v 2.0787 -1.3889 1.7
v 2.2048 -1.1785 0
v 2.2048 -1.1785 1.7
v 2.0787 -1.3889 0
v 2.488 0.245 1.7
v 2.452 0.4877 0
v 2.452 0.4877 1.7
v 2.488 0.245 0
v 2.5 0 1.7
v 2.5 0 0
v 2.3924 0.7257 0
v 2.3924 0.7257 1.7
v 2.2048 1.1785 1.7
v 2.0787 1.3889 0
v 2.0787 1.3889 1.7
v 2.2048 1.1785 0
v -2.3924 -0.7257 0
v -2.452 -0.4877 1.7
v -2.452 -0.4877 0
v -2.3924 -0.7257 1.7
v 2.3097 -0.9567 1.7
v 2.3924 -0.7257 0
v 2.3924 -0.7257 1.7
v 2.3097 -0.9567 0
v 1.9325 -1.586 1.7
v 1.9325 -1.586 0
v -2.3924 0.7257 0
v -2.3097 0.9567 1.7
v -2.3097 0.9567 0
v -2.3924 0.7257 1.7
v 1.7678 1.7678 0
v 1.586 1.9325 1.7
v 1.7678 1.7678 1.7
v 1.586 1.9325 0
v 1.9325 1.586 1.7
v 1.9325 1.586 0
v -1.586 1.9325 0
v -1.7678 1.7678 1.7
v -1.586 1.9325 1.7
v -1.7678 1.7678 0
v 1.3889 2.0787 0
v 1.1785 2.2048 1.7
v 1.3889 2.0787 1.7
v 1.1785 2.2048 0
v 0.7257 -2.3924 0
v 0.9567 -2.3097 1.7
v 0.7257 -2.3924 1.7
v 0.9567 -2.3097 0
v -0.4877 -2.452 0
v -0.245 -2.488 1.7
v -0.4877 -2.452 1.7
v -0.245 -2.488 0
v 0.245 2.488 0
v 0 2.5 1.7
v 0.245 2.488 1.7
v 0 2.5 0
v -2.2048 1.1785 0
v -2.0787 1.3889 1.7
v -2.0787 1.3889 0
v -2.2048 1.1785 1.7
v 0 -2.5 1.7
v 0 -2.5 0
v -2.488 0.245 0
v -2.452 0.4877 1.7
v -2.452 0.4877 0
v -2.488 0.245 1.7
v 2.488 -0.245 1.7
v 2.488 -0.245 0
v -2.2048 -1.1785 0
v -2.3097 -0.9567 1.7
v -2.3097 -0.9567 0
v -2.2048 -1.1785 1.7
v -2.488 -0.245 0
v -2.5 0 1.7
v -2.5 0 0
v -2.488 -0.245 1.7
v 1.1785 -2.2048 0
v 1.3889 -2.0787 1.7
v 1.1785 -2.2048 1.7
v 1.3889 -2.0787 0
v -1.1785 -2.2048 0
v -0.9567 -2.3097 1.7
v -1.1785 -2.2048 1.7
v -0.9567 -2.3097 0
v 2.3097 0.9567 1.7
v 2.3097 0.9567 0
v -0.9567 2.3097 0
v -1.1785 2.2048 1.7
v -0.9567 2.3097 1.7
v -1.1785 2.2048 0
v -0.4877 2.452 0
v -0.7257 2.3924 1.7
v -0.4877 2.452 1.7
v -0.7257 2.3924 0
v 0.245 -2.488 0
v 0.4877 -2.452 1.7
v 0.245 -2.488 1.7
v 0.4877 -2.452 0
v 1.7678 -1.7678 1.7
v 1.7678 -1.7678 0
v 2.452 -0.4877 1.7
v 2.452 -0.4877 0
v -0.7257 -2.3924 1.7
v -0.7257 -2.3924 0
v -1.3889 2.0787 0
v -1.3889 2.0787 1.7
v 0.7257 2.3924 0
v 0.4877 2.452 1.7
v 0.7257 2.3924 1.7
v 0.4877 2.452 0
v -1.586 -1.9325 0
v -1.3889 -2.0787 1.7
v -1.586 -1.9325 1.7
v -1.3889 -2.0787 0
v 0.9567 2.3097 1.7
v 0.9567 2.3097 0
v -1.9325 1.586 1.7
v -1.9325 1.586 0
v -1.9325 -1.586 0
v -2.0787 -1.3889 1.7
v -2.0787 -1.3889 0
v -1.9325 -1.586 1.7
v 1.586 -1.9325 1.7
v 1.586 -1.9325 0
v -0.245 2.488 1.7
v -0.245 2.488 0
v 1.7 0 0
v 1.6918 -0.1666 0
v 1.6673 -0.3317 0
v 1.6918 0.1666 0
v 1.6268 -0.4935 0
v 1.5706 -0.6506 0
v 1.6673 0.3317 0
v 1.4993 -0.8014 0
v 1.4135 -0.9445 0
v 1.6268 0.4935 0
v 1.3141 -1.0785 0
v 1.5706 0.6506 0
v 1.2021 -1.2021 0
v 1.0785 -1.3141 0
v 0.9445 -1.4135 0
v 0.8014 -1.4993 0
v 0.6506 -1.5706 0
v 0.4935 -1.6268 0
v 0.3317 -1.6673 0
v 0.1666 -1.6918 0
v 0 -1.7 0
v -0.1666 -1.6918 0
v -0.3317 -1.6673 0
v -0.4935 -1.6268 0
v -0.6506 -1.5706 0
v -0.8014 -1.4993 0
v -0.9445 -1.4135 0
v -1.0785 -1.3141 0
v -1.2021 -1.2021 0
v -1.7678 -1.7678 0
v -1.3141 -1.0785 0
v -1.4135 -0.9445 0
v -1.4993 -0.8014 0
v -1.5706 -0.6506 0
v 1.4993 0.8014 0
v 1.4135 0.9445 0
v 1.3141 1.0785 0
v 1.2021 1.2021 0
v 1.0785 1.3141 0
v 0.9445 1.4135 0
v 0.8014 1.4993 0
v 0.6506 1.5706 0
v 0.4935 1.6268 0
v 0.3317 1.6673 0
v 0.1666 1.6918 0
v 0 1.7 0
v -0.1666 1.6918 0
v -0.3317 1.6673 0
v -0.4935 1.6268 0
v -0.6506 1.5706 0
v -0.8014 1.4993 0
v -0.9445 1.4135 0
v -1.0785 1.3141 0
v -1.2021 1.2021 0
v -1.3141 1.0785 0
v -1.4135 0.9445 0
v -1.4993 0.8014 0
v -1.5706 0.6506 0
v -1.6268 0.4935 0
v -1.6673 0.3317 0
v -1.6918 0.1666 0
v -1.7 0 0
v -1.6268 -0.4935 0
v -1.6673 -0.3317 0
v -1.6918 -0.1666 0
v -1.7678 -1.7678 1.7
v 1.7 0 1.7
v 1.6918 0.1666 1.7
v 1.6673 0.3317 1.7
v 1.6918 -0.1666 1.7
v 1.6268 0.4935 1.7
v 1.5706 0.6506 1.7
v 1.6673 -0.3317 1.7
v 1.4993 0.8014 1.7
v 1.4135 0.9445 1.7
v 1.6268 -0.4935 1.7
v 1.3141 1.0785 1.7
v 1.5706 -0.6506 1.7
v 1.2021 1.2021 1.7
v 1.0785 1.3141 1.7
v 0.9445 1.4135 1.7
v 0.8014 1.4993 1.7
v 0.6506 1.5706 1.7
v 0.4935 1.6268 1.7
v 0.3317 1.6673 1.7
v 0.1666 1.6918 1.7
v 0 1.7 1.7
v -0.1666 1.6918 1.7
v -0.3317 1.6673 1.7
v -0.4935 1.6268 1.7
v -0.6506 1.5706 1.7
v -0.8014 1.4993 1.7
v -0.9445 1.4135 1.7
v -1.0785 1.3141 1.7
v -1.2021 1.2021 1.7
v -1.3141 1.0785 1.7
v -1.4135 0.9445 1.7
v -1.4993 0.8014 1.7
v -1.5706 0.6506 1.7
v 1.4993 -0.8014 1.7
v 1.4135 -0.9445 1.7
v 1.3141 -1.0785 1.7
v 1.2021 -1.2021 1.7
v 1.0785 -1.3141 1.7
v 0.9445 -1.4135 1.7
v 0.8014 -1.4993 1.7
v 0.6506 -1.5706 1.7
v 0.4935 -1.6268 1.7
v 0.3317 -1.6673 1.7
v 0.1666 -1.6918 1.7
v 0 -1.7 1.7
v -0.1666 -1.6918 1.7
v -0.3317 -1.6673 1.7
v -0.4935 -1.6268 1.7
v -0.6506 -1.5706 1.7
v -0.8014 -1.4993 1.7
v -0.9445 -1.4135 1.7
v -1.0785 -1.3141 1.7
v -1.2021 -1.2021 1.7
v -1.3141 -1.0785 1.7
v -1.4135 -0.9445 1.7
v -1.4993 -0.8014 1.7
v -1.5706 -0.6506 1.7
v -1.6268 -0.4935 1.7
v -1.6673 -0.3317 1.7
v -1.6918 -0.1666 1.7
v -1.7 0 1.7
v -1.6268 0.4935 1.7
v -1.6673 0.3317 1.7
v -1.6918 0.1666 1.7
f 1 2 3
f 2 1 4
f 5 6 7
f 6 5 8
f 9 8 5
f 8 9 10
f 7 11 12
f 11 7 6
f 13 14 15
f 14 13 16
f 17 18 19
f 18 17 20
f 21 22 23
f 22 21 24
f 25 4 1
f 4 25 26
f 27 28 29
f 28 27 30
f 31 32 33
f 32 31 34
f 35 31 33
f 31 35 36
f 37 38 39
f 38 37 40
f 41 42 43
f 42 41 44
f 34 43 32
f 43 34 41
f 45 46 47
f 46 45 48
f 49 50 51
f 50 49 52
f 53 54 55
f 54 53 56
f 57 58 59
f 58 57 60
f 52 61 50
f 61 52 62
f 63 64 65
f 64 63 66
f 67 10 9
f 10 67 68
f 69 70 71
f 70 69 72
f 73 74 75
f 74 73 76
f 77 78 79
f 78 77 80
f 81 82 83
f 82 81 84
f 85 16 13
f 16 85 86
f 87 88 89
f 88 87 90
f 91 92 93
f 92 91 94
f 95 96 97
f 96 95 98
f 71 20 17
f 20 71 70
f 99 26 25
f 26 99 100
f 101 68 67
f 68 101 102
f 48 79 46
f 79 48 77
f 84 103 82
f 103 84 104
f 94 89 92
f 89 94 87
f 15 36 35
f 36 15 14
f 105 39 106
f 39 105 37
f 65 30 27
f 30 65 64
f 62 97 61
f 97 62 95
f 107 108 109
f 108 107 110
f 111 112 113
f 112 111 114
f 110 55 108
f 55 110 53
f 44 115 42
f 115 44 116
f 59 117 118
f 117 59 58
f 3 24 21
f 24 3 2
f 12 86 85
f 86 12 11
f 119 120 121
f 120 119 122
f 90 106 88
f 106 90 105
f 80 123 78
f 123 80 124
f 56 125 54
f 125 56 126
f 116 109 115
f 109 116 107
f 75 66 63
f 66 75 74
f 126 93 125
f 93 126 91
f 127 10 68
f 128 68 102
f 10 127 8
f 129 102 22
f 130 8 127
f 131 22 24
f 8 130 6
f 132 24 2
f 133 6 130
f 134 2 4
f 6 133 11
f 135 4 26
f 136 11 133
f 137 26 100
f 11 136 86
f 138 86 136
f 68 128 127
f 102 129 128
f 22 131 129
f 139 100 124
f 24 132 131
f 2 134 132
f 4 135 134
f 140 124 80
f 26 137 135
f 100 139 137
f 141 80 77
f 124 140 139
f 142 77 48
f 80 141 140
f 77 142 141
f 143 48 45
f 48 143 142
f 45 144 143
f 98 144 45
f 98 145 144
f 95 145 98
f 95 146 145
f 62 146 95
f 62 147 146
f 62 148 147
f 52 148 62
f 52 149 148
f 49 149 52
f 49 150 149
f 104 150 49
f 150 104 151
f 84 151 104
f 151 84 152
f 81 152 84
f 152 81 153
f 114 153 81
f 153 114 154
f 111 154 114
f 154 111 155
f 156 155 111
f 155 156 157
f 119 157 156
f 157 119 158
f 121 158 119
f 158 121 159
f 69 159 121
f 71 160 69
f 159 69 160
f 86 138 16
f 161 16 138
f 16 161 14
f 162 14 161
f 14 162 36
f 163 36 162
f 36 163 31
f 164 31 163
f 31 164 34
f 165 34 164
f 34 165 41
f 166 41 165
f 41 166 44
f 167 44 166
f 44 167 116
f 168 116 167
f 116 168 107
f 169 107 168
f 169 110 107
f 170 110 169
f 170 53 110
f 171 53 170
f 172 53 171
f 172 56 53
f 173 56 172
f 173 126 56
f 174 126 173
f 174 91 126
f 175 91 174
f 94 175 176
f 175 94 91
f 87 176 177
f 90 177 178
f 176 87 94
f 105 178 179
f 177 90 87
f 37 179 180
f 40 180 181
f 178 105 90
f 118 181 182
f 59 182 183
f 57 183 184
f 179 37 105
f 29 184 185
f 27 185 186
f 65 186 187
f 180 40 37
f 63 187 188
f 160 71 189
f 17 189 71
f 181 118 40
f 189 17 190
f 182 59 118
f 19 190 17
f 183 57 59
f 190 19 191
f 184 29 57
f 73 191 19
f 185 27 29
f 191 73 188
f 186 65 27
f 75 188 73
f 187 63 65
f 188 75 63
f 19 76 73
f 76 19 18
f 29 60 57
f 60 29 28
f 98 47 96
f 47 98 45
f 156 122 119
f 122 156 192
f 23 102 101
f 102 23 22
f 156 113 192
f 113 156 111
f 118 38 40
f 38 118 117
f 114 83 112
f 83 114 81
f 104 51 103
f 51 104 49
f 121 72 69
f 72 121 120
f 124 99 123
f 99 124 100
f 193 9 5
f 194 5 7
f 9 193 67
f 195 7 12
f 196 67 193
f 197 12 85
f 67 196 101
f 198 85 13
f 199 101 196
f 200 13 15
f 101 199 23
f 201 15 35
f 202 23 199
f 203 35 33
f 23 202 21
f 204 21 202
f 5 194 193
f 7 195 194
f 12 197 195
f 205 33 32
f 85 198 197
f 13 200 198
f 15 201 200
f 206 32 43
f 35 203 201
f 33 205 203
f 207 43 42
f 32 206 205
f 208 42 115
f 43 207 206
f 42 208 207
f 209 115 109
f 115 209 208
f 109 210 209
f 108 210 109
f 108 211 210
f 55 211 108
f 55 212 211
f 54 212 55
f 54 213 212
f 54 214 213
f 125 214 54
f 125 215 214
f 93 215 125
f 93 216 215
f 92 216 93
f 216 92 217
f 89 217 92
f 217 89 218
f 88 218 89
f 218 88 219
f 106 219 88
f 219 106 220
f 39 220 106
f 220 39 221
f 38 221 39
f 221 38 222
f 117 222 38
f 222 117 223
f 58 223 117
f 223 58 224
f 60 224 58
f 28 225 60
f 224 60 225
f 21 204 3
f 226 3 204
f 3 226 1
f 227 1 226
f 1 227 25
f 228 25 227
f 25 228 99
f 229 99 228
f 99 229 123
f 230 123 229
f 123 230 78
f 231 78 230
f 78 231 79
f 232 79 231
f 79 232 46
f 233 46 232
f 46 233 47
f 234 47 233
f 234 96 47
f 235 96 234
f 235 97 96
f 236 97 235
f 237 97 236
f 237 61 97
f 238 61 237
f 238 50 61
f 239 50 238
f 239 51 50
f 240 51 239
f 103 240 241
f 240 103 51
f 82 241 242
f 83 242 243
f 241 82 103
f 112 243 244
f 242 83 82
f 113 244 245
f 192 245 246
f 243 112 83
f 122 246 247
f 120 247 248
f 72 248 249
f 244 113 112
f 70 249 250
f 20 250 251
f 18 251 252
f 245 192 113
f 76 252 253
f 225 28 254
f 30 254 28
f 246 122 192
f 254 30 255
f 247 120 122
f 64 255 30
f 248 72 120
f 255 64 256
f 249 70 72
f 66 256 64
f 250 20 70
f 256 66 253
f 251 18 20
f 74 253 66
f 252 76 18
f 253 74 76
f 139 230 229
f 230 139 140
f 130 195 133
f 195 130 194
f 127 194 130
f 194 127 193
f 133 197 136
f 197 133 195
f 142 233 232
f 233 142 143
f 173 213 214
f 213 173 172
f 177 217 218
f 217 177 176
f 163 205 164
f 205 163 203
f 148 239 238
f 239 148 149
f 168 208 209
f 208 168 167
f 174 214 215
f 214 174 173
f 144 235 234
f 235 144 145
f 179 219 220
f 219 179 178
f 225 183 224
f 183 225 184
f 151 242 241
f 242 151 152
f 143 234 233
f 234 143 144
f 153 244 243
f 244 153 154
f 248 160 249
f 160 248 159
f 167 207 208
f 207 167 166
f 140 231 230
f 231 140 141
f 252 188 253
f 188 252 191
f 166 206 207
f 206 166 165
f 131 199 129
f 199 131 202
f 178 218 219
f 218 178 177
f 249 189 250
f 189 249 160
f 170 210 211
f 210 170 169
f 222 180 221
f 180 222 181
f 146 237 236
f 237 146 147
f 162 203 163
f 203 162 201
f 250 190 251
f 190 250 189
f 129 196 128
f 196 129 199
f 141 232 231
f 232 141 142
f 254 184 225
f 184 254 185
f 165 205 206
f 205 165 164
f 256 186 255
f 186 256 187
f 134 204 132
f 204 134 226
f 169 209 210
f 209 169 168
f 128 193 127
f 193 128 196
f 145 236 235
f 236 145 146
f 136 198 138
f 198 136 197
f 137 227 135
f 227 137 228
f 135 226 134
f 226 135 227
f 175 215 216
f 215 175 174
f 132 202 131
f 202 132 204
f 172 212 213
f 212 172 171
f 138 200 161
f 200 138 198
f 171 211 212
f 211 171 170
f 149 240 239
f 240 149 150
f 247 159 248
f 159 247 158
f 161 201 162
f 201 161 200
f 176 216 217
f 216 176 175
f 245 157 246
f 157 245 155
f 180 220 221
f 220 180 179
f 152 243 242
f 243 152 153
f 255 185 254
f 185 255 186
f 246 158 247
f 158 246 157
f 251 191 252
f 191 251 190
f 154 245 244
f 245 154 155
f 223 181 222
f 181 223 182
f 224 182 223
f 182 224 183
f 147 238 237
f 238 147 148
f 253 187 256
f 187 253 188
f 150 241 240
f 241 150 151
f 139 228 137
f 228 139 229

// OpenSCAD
// --- Parameters ---
$fn = 64; 

m3_inner_d   = 3.4;   // Clearance (prevents the "threaded hole" effect)
m5_slot_d    = 5.0;   // True M5 size (FDM will usually print this at ~4.9mm)
total_thick  = 2.5;   

// Screw Head Cutout 
// (Using the screw head itself as the washer)
head_d       = 5.6;   // M3 Socket heads are ~5.5mm
head_depth   = 0.8;   // Typical depth of one "step" or washer thickness

// --- The M5 Sized Puck ---
difference() {
    // 1. The Main Cylinder
    cylinder(h = total_thick, d = m5_slot_d);
    
    // 2. The Cutout 
    // This creates a seat so the head doesn't slide around
    translate([0, 0, total_thick - head_depth])
        cylinder(h = head_depth + 0.1, d = head_d);

    // 3. The M3 Through-Hole
    translate([0, 0, -1])
        cylinder(h = total_thick + 2, d = m3_inner_d);
}
